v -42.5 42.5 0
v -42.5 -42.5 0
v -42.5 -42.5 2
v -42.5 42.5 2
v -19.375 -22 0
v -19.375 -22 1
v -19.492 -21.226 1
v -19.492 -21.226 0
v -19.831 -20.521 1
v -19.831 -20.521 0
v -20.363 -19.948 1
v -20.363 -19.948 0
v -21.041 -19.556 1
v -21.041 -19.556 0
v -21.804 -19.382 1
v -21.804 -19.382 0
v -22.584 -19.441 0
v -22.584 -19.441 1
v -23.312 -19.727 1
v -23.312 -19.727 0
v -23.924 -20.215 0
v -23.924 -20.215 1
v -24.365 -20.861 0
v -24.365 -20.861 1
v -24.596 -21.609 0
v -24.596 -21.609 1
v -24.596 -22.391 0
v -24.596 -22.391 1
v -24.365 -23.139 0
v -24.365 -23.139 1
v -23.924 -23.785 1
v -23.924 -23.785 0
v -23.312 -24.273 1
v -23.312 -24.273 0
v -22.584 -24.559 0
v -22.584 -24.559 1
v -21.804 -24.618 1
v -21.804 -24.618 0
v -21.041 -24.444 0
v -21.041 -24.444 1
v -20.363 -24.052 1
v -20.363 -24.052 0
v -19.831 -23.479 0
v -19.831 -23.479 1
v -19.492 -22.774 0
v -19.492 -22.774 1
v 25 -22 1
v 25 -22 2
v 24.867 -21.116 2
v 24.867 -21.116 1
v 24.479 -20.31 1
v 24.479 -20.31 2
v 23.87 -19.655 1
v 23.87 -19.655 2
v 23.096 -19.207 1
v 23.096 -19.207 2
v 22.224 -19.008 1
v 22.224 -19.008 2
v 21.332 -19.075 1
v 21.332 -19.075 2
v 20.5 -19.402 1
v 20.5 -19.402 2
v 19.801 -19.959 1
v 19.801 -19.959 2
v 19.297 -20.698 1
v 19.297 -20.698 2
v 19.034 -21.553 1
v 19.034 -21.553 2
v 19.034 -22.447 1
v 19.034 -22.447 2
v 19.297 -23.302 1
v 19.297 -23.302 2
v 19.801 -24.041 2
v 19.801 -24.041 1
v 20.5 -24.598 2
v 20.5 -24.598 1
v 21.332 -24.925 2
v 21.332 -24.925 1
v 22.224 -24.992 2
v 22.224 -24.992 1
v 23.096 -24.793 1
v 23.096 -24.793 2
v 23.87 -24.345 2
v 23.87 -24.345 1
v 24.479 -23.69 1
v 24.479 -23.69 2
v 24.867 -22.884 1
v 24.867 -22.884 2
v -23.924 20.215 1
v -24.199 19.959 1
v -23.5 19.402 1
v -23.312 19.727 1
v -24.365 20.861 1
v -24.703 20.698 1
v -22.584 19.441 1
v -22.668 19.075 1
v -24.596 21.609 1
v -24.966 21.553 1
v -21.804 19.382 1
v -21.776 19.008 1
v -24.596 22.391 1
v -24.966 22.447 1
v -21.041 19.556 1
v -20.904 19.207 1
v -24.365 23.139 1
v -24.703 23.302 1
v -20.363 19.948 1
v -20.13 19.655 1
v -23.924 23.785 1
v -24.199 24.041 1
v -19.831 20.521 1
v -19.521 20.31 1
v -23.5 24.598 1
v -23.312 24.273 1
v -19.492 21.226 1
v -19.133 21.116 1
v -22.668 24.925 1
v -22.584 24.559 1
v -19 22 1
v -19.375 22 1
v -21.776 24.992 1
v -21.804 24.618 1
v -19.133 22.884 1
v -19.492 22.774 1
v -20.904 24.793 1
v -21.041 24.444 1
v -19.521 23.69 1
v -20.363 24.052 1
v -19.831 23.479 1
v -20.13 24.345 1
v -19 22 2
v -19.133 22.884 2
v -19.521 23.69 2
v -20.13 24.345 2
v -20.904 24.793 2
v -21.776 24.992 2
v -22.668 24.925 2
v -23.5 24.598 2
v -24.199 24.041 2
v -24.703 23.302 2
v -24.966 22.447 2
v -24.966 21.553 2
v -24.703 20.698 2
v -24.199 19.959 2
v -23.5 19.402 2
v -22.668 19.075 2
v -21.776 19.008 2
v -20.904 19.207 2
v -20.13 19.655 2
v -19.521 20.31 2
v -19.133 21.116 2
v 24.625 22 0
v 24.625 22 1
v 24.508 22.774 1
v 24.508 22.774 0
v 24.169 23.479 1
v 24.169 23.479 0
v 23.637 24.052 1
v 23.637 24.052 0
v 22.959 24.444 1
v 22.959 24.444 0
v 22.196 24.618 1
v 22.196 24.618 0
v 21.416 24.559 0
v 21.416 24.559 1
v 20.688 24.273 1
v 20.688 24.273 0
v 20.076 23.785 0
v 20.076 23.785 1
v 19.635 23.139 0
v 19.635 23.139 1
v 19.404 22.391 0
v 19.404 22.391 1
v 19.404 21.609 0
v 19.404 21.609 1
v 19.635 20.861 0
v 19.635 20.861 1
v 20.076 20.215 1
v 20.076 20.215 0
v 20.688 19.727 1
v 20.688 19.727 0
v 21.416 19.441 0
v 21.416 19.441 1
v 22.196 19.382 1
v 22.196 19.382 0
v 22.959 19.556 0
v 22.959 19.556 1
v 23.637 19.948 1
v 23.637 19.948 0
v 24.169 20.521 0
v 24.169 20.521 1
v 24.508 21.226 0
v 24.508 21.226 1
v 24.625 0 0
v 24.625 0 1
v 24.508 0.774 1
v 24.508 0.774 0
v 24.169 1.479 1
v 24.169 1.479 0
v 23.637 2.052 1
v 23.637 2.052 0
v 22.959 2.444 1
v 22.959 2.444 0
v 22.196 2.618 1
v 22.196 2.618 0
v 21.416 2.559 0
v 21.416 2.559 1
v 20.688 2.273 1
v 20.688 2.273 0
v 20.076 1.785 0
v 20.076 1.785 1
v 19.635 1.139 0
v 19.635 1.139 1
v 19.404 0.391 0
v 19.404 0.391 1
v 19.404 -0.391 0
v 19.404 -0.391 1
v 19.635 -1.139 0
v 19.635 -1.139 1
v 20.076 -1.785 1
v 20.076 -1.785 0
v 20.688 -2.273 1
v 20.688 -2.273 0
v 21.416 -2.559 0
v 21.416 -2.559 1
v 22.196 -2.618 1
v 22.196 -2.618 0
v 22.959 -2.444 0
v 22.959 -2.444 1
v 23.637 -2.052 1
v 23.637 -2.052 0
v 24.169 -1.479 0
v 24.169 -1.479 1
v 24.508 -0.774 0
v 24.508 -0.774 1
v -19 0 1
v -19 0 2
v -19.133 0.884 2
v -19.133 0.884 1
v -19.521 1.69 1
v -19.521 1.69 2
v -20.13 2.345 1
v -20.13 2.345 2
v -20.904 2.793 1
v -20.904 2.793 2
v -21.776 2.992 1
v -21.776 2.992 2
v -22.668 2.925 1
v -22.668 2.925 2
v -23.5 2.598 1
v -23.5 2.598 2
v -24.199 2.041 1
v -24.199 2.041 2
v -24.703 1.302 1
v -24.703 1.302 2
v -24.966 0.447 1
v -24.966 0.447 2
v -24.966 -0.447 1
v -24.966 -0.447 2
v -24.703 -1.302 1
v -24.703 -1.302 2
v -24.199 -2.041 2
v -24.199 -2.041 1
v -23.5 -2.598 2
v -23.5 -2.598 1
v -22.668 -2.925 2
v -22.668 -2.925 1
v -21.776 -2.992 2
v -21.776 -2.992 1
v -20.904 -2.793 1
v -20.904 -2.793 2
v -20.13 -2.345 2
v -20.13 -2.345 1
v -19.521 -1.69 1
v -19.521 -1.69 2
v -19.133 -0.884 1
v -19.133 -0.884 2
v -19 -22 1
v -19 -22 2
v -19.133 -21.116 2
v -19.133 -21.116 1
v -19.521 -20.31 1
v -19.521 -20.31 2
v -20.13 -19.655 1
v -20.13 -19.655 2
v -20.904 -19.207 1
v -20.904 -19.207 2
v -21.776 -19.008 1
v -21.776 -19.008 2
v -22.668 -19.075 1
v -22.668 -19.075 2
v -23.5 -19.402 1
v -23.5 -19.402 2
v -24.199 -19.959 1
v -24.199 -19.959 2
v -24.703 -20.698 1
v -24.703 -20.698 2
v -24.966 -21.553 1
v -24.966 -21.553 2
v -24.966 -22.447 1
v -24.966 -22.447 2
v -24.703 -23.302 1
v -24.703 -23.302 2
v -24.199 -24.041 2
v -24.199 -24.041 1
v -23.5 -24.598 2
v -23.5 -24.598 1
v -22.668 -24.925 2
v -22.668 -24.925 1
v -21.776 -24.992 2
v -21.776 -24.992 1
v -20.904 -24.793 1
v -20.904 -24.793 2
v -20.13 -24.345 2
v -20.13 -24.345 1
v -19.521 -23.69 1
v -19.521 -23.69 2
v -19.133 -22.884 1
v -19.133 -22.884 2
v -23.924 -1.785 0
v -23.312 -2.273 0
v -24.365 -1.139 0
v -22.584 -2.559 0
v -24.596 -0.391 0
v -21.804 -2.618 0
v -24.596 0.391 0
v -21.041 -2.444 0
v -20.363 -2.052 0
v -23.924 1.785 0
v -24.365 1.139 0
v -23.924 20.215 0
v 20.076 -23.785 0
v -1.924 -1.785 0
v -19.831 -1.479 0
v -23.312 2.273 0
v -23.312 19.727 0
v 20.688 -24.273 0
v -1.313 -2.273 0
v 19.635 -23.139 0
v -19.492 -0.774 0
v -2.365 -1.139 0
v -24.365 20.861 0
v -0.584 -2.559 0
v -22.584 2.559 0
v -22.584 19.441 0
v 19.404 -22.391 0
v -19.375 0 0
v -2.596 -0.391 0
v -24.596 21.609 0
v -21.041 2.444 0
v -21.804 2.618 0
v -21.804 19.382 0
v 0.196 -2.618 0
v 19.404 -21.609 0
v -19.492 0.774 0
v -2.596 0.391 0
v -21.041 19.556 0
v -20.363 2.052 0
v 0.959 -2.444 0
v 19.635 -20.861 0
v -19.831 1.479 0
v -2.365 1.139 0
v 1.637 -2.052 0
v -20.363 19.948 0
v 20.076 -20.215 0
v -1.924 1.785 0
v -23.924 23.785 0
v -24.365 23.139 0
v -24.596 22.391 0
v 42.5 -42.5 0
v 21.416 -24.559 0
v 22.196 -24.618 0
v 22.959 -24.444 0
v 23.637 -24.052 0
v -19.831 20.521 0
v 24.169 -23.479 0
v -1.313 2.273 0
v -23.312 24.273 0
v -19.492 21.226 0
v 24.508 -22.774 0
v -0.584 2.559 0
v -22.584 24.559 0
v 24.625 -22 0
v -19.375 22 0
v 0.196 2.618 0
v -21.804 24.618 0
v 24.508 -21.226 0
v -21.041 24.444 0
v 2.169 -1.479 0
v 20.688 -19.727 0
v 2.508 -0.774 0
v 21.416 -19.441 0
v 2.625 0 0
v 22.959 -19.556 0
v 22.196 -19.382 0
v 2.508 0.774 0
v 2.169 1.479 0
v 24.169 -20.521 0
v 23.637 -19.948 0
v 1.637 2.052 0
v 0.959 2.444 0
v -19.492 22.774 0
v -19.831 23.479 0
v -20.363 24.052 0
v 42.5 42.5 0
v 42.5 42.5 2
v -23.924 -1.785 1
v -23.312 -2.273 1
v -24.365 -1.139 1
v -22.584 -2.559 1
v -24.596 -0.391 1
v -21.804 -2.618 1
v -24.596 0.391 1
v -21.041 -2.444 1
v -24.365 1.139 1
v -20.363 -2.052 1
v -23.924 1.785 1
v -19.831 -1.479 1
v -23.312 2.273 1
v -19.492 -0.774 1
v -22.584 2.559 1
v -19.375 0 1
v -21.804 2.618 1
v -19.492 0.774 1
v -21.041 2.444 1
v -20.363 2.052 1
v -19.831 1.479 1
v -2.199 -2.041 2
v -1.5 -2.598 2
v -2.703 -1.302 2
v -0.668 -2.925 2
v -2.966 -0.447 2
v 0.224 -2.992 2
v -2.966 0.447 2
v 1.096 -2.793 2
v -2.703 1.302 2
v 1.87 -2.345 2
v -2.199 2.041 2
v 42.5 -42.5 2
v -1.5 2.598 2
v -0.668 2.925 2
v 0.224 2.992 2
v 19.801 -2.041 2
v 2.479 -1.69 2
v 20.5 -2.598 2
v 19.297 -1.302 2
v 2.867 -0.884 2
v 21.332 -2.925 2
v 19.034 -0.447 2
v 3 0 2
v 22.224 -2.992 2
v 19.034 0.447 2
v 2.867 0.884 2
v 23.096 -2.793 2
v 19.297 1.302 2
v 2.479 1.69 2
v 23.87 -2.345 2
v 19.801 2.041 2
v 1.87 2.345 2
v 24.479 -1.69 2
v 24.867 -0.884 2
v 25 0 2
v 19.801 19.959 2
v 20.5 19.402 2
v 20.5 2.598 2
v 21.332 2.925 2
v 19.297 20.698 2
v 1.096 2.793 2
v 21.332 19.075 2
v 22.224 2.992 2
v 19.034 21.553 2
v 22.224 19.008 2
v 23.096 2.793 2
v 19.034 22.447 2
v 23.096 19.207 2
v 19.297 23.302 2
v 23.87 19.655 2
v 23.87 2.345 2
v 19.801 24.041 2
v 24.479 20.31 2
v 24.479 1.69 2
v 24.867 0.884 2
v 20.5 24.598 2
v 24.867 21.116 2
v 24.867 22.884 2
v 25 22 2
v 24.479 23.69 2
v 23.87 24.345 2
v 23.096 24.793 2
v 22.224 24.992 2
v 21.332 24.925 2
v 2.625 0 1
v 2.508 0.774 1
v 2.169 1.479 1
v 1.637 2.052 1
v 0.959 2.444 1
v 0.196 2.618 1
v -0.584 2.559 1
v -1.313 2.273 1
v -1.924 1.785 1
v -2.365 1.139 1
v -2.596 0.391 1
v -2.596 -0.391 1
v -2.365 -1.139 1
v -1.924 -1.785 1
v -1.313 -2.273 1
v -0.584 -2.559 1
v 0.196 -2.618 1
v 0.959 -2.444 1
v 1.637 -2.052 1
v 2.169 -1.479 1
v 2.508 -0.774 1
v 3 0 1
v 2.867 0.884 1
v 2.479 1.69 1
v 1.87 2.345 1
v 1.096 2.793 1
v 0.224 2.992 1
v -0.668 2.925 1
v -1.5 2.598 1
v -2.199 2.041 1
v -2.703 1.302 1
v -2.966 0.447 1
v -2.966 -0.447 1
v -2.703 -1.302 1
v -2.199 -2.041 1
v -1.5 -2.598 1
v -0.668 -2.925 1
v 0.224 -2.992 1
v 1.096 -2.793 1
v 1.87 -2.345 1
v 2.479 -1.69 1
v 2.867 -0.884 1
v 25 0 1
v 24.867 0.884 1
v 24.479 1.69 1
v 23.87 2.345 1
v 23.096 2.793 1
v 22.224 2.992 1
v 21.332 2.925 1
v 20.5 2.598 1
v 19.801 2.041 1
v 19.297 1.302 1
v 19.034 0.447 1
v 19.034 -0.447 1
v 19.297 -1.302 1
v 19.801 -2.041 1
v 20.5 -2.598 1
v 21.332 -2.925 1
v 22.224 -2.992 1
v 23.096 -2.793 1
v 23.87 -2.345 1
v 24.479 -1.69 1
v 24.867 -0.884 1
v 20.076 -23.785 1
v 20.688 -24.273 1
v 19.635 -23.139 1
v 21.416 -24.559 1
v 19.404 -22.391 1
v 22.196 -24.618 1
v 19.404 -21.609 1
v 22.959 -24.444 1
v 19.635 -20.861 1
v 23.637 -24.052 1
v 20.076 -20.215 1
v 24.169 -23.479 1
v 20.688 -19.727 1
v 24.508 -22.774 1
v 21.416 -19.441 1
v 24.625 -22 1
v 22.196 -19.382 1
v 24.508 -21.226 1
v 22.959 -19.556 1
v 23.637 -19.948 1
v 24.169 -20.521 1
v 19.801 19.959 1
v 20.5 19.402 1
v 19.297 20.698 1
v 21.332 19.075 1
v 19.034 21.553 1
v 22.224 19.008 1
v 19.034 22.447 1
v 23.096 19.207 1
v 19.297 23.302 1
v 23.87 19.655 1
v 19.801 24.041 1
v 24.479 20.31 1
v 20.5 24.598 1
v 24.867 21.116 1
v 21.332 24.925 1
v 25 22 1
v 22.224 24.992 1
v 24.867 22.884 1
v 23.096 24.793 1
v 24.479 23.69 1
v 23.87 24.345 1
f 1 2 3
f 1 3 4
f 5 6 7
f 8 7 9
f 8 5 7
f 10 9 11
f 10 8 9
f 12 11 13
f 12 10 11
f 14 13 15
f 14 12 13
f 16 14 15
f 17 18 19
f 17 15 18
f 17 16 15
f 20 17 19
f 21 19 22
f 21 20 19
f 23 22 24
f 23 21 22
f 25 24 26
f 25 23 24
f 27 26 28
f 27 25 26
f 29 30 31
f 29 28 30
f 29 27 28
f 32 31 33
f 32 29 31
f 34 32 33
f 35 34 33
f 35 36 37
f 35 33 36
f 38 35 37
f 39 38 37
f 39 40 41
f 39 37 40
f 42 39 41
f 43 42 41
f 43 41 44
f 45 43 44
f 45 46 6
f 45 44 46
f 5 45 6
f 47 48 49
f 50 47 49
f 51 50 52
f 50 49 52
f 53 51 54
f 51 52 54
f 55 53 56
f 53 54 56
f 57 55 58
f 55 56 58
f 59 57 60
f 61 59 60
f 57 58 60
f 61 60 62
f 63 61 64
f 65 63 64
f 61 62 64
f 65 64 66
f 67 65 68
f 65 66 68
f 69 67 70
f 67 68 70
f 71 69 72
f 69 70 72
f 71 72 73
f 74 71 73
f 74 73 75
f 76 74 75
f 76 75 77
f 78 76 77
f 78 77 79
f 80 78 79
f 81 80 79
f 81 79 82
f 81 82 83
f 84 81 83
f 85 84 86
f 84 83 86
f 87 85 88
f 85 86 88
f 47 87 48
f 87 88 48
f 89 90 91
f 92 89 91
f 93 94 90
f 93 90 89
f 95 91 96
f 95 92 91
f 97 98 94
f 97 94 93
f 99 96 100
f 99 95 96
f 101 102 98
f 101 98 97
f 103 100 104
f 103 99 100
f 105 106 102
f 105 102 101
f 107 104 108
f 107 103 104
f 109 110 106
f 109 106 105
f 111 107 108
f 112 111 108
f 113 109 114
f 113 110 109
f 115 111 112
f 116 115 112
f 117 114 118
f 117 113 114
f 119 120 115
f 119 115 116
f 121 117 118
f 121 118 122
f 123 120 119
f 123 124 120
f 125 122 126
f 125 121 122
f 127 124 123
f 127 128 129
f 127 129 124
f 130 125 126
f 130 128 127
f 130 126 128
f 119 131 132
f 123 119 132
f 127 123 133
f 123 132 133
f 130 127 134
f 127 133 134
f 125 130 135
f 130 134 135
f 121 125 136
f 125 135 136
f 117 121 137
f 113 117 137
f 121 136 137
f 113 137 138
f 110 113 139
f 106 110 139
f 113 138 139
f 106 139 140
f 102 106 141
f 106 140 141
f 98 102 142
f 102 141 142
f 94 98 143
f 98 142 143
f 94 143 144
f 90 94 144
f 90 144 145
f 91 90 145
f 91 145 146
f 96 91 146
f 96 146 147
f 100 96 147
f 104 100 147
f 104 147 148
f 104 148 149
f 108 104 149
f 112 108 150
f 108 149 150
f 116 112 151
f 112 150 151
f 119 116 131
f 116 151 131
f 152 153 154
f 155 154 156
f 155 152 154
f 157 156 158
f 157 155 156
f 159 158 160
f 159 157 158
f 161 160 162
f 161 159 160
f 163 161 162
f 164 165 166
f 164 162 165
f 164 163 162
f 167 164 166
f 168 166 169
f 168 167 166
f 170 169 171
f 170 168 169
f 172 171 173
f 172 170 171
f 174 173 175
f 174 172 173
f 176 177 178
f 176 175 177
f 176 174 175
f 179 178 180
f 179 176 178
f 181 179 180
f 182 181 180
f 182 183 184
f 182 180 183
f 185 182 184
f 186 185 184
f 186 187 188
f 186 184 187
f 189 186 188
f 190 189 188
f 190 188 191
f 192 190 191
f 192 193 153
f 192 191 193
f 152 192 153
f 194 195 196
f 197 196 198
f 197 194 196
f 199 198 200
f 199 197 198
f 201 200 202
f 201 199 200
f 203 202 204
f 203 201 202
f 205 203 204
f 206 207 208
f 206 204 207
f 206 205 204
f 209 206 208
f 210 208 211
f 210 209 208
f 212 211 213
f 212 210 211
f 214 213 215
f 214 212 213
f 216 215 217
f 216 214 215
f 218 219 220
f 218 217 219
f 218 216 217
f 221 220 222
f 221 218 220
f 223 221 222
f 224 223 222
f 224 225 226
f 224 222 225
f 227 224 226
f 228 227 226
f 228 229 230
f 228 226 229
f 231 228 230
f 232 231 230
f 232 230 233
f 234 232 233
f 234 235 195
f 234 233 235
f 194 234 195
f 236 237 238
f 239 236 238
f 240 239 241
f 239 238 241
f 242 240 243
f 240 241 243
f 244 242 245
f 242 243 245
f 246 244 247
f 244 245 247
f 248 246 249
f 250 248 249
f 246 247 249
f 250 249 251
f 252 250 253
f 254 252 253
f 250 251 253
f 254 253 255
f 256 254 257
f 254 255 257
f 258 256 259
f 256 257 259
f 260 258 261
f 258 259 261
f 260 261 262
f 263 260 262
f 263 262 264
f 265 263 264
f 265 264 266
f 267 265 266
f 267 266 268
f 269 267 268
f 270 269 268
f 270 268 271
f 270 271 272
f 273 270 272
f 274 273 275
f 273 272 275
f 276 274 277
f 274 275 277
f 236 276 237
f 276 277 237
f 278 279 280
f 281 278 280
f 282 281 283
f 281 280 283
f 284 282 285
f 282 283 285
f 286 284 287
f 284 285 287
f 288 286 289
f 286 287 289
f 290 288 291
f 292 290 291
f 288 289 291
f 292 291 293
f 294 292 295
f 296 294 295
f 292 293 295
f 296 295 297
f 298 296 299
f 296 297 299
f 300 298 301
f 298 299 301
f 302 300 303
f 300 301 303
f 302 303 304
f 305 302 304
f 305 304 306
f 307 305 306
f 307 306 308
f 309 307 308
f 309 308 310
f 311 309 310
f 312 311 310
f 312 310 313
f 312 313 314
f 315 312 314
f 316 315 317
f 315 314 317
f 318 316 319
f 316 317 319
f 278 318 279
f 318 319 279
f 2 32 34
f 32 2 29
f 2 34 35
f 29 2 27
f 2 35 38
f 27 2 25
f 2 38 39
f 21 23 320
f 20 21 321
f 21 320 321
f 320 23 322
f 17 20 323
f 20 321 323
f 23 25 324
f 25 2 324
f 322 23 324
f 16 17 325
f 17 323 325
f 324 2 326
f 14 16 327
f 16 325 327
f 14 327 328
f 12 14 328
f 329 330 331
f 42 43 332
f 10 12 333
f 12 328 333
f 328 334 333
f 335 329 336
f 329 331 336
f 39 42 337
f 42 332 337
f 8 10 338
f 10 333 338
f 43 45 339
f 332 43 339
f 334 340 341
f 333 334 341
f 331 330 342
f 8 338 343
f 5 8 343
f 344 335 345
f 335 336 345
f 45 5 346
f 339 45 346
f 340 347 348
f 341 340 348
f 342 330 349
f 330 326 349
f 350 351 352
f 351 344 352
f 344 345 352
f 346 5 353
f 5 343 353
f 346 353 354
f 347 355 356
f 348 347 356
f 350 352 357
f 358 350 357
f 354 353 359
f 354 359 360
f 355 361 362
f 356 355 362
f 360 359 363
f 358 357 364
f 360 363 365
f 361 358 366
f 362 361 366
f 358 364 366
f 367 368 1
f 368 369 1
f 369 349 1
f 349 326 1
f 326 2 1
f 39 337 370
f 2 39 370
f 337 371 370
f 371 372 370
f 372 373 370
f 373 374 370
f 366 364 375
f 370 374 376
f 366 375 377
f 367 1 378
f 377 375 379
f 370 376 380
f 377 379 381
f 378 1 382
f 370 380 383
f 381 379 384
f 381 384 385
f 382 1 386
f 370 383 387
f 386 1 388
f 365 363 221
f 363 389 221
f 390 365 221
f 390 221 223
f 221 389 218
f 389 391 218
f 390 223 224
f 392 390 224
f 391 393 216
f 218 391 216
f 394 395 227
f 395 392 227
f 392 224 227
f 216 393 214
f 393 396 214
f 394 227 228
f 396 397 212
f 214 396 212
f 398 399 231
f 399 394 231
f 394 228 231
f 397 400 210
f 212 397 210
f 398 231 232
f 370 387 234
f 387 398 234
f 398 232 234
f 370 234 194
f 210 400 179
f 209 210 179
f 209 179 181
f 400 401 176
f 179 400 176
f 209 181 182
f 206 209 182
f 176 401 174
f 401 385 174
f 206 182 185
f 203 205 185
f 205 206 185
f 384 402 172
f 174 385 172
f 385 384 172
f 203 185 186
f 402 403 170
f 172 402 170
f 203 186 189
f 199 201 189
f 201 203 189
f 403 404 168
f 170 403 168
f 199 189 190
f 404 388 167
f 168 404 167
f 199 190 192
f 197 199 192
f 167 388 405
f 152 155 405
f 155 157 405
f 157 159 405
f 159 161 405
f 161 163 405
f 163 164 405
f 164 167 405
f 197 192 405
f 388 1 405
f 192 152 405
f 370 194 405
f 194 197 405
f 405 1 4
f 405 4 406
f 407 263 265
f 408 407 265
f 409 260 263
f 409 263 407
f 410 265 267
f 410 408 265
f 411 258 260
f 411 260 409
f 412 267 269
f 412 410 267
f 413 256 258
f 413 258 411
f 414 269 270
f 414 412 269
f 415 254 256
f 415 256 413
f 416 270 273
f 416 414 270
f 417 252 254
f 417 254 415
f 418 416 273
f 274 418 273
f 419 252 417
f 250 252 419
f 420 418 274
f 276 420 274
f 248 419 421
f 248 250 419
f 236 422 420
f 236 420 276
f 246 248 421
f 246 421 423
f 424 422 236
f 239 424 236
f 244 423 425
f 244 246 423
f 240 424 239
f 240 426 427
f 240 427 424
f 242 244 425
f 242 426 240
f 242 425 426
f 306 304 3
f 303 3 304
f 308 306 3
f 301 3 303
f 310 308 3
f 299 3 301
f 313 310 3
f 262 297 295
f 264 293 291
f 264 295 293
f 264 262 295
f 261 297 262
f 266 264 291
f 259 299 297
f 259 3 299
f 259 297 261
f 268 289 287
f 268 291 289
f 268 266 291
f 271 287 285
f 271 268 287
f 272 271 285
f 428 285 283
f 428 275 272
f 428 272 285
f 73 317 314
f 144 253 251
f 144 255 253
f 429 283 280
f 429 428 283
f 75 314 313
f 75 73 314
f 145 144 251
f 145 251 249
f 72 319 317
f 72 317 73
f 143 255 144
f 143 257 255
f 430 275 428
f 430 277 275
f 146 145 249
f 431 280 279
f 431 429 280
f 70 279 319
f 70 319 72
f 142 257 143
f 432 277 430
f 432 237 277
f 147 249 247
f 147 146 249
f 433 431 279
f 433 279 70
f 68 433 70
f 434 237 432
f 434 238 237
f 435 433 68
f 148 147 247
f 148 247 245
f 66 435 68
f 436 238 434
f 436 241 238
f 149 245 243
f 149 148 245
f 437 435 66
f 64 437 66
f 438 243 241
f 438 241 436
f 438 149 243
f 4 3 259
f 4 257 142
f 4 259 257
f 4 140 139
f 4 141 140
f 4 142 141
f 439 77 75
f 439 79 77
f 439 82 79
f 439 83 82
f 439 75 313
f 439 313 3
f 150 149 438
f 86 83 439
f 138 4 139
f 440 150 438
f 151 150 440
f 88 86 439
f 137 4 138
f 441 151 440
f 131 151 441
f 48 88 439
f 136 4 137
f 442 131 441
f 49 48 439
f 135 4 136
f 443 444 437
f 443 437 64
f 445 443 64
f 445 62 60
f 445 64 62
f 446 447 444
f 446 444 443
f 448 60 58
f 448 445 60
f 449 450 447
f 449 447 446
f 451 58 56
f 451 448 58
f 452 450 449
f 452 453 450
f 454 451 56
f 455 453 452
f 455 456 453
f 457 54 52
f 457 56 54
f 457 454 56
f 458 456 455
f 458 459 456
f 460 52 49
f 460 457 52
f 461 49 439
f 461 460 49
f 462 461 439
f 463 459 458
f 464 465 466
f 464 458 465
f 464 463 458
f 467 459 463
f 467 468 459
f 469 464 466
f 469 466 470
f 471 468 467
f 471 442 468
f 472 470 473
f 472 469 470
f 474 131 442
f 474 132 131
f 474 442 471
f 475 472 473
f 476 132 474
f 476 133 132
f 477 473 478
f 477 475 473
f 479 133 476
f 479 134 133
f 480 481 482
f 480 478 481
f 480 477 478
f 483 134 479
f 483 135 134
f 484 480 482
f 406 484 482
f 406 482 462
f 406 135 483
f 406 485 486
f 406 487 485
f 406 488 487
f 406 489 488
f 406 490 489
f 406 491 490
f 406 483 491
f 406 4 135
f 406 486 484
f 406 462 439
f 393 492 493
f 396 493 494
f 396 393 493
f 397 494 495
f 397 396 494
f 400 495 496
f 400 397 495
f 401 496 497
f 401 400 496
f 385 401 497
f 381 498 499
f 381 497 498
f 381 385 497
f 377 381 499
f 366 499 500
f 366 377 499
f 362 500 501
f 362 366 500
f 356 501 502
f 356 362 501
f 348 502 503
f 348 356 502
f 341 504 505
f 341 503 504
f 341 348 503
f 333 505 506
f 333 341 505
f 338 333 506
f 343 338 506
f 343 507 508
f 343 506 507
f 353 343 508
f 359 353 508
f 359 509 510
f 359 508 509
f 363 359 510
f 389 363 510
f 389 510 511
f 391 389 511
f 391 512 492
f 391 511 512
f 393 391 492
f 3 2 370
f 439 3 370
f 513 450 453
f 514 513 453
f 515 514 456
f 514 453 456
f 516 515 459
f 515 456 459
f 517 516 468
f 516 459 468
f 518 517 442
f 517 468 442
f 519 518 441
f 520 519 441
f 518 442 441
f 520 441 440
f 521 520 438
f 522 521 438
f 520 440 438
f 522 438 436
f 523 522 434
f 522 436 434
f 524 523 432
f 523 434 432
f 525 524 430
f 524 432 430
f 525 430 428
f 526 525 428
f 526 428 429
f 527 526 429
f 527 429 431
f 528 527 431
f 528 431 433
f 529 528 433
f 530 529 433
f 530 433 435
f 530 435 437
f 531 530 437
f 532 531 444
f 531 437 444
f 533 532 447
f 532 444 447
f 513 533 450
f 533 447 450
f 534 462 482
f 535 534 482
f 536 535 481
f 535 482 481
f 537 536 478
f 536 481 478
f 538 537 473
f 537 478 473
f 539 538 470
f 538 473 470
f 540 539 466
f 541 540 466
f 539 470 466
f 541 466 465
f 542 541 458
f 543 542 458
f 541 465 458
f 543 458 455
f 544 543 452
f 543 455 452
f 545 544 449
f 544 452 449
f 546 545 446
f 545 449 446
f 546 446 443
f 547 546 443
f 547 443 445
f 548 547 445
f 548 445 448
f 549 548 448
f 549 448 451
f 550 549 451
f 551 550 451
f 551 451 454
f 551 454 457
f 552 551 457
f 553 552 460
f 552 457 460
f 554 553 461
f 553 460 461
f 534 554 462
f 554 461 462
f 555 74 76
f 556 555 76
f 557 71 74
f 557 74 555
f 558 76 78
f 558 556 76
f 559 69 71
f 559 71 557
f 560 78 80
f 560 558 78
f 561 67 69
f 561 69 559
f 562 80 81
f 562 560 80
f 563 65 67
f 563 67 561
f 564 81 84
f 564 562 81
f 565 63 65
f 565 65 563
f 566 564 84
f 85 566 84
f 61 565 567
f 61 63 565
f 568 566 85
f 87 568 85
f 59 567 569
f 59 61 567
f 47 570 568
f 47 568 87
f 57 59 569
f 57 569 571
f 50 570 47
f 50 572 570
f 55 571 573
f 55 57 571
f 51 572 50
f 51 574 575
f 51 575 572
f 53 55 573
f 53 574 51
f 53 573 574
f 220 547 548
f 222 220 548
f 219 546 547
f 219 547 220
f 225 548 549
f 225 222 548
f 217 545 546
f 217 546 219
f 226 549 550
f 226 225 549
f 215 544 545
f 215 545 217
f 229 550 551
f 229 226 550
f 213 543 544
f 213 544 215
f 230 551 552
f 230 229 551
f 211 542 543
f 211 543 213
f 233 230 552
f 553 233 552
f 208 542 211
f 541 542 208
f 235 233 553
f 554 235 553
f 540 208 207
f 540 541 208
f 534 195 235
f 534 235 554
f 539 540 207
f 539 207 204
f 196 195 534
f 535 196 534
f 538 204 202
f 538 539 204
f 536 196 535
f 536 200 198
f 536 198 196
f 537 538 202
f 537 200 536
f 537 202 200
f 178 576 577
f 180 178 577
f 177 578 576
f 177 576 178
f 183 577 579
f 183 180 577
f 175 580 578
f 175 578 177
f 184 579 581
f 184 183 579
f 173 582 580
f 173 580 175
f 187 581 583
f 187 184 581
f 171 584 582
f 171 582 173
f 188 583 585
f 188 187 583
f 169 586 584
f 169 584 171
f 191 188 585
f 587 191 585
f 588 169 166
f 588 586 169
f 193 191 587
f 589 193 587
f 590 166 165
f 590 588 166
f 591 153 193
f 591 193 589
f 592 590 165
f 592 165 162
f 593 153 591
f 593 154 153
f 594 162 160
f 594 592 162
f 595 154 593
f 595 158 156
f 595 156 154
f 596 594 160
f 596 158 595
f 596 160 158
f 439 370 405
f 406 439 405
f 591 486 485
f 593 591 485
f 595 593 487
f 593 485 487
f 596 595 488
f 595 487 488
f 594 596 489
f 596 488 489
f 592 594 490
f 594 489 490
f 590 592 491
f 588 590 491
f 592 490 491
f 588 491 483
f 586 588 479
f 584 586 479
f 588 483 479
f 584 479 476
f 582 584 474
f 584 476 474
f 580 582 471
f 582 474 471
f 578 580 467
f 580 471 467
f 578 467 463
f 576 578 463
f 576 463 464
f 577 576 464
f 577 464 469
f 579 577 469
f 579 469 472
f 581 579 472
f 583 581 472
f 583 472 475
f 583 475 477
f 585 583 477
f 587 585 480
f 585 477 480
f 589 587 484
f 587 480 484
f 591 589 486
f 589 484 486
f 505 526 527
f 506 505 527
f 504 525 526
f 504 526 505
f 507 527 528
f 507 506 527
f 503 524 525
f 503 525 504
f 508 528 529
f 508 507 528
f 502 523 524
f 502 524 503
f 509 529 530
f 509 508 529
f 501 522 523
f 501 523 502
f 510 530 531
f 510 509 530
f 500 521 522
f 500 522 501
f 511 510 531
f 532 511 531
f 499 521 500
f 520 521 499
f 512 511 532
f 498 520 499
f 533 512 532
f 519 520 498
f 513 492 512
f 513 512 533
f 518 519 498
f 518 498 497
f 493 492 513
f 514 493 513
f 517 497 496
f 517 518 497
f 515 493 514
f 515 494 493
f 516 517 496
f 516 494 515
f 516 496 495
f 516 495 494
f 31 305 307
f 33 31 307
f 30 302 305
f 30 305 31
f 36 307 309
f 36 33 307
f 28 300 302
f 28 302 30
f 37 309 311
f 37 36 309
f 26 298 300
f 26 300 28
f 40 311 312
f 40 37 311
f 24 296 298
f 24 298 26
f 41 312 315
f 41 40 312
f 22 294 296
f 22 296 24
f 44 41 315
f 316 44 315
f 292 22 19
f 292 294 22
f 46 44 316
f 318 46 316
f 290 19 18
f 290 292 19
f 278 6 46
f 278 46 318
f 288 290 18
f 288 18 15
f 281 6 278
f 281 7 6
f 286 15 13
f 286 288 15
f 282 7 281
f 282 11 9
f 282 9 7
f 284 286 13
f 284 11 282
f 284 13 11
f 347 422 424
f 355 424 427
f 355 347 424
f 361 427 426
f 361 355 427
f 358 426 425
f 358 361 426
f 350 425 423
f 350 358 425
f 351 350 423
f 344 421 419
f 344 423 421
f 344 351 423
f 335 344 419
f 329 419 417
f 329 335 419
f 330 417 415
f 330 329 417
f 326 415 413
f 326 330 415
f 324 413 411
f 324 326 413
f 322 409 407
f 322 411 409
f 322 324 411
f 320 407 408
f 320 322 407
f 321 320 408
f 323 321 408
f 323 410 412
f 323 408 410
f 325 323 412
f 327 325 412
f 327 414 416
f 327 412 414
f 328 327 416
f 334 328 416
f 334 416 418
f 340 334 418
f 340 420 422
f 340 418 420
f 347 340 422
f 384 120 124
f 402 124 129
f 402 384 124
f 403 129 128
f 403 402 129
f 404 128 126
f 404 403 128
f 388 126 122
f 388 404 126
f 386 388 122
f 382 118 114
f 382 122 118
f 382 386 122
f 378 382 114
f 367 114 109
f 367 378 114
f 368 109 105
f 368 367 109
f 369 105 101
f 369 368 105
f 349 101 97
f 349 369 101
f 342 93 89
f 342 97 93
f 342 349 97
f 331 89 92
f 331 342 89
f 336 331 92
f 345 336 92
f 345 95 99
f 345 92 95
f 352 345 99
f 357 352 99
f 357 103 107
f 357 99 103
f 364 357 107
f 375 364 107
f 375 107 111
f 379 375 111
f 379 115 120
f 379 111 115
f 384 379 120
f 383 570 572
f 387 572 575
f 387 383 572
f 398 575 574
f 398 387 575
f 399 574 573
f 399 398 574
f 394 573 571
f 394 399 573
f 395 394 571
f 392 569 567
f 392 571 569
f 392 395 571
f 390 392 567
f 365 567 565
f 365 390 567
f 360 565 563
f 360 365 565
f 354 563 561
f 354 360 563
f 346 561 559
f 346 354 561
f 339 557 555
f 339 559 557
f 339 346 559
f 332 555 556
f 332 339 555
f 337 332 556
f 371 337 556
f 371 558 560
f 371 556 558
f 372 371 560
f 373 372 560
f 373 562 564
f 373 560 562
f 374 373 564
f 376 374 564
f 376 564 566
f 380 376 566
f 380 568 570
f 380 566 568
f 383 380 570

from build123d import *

# Parameters (mm, degrees)
SKETCH_W     = 85
SKETCH_H     = 85
SKETCH_R     = 2.625
PAD_DEPTH    = 2
SKETCH001_R  = 3
POCKET_DEPTH = 1


with BuildPart() as part:
    # Sketch → Pad (new body)
    with BuildSketch(Plane.XY):
        Rectangle(SKETCH_W, SKETCH_H)
        with Locations((-22, 22)):
            Circle(SKETCH_R, mode=Mode.SUBTRACT)
        with Locations((-22, 0)):
            Circle(SKETCH_R, mode=Mode.SUBTRACT)
        with Locations((-22, -22)):
            Circle(SKETCH_R, mode=Mode.SUBTRACT)
        Circle(SKETCH_R, mode=Mode.SUBTRACT)
        with Locations((22, 22)):
            Circle(SKETCH_R, mode=Mode.SUBTRACT)
        with Locations((22, 0)):
            Circle(SKETCH_R, mode=Mode.SUBTRACT)
        with Locations((22, -22)):
            Circle(SKETCH_R, mode=Mode.SUBTRACT)
    extrude(amount=PAD_DEPTH)

    # Sketch001 (on Face13 of Pad) → Pocket (cut)
    with BuildSketch(Plane.XY.offset(2)):
        with Locations((-22, 22)):
            Circle(SKETCH001_R)
        with Locations((-22, 0)):
            Circle(SKETCH001_R)
        with Locations((-22, -22)):
            Circle(SKETCH001_R)
        Circle(SKETCH001_R)
        with Locations((22, 0)):
            Circle(SKETCH001_R)
        with Locations((22, 22)):
            Circle(SKETCH001_R)
        with Locations((22, -22)):
            Circle(SKETCH001_R)
    extrude(amount=-POCKET_DEPTH, mode=Mode.SUBTRACT)


solid = part.part
